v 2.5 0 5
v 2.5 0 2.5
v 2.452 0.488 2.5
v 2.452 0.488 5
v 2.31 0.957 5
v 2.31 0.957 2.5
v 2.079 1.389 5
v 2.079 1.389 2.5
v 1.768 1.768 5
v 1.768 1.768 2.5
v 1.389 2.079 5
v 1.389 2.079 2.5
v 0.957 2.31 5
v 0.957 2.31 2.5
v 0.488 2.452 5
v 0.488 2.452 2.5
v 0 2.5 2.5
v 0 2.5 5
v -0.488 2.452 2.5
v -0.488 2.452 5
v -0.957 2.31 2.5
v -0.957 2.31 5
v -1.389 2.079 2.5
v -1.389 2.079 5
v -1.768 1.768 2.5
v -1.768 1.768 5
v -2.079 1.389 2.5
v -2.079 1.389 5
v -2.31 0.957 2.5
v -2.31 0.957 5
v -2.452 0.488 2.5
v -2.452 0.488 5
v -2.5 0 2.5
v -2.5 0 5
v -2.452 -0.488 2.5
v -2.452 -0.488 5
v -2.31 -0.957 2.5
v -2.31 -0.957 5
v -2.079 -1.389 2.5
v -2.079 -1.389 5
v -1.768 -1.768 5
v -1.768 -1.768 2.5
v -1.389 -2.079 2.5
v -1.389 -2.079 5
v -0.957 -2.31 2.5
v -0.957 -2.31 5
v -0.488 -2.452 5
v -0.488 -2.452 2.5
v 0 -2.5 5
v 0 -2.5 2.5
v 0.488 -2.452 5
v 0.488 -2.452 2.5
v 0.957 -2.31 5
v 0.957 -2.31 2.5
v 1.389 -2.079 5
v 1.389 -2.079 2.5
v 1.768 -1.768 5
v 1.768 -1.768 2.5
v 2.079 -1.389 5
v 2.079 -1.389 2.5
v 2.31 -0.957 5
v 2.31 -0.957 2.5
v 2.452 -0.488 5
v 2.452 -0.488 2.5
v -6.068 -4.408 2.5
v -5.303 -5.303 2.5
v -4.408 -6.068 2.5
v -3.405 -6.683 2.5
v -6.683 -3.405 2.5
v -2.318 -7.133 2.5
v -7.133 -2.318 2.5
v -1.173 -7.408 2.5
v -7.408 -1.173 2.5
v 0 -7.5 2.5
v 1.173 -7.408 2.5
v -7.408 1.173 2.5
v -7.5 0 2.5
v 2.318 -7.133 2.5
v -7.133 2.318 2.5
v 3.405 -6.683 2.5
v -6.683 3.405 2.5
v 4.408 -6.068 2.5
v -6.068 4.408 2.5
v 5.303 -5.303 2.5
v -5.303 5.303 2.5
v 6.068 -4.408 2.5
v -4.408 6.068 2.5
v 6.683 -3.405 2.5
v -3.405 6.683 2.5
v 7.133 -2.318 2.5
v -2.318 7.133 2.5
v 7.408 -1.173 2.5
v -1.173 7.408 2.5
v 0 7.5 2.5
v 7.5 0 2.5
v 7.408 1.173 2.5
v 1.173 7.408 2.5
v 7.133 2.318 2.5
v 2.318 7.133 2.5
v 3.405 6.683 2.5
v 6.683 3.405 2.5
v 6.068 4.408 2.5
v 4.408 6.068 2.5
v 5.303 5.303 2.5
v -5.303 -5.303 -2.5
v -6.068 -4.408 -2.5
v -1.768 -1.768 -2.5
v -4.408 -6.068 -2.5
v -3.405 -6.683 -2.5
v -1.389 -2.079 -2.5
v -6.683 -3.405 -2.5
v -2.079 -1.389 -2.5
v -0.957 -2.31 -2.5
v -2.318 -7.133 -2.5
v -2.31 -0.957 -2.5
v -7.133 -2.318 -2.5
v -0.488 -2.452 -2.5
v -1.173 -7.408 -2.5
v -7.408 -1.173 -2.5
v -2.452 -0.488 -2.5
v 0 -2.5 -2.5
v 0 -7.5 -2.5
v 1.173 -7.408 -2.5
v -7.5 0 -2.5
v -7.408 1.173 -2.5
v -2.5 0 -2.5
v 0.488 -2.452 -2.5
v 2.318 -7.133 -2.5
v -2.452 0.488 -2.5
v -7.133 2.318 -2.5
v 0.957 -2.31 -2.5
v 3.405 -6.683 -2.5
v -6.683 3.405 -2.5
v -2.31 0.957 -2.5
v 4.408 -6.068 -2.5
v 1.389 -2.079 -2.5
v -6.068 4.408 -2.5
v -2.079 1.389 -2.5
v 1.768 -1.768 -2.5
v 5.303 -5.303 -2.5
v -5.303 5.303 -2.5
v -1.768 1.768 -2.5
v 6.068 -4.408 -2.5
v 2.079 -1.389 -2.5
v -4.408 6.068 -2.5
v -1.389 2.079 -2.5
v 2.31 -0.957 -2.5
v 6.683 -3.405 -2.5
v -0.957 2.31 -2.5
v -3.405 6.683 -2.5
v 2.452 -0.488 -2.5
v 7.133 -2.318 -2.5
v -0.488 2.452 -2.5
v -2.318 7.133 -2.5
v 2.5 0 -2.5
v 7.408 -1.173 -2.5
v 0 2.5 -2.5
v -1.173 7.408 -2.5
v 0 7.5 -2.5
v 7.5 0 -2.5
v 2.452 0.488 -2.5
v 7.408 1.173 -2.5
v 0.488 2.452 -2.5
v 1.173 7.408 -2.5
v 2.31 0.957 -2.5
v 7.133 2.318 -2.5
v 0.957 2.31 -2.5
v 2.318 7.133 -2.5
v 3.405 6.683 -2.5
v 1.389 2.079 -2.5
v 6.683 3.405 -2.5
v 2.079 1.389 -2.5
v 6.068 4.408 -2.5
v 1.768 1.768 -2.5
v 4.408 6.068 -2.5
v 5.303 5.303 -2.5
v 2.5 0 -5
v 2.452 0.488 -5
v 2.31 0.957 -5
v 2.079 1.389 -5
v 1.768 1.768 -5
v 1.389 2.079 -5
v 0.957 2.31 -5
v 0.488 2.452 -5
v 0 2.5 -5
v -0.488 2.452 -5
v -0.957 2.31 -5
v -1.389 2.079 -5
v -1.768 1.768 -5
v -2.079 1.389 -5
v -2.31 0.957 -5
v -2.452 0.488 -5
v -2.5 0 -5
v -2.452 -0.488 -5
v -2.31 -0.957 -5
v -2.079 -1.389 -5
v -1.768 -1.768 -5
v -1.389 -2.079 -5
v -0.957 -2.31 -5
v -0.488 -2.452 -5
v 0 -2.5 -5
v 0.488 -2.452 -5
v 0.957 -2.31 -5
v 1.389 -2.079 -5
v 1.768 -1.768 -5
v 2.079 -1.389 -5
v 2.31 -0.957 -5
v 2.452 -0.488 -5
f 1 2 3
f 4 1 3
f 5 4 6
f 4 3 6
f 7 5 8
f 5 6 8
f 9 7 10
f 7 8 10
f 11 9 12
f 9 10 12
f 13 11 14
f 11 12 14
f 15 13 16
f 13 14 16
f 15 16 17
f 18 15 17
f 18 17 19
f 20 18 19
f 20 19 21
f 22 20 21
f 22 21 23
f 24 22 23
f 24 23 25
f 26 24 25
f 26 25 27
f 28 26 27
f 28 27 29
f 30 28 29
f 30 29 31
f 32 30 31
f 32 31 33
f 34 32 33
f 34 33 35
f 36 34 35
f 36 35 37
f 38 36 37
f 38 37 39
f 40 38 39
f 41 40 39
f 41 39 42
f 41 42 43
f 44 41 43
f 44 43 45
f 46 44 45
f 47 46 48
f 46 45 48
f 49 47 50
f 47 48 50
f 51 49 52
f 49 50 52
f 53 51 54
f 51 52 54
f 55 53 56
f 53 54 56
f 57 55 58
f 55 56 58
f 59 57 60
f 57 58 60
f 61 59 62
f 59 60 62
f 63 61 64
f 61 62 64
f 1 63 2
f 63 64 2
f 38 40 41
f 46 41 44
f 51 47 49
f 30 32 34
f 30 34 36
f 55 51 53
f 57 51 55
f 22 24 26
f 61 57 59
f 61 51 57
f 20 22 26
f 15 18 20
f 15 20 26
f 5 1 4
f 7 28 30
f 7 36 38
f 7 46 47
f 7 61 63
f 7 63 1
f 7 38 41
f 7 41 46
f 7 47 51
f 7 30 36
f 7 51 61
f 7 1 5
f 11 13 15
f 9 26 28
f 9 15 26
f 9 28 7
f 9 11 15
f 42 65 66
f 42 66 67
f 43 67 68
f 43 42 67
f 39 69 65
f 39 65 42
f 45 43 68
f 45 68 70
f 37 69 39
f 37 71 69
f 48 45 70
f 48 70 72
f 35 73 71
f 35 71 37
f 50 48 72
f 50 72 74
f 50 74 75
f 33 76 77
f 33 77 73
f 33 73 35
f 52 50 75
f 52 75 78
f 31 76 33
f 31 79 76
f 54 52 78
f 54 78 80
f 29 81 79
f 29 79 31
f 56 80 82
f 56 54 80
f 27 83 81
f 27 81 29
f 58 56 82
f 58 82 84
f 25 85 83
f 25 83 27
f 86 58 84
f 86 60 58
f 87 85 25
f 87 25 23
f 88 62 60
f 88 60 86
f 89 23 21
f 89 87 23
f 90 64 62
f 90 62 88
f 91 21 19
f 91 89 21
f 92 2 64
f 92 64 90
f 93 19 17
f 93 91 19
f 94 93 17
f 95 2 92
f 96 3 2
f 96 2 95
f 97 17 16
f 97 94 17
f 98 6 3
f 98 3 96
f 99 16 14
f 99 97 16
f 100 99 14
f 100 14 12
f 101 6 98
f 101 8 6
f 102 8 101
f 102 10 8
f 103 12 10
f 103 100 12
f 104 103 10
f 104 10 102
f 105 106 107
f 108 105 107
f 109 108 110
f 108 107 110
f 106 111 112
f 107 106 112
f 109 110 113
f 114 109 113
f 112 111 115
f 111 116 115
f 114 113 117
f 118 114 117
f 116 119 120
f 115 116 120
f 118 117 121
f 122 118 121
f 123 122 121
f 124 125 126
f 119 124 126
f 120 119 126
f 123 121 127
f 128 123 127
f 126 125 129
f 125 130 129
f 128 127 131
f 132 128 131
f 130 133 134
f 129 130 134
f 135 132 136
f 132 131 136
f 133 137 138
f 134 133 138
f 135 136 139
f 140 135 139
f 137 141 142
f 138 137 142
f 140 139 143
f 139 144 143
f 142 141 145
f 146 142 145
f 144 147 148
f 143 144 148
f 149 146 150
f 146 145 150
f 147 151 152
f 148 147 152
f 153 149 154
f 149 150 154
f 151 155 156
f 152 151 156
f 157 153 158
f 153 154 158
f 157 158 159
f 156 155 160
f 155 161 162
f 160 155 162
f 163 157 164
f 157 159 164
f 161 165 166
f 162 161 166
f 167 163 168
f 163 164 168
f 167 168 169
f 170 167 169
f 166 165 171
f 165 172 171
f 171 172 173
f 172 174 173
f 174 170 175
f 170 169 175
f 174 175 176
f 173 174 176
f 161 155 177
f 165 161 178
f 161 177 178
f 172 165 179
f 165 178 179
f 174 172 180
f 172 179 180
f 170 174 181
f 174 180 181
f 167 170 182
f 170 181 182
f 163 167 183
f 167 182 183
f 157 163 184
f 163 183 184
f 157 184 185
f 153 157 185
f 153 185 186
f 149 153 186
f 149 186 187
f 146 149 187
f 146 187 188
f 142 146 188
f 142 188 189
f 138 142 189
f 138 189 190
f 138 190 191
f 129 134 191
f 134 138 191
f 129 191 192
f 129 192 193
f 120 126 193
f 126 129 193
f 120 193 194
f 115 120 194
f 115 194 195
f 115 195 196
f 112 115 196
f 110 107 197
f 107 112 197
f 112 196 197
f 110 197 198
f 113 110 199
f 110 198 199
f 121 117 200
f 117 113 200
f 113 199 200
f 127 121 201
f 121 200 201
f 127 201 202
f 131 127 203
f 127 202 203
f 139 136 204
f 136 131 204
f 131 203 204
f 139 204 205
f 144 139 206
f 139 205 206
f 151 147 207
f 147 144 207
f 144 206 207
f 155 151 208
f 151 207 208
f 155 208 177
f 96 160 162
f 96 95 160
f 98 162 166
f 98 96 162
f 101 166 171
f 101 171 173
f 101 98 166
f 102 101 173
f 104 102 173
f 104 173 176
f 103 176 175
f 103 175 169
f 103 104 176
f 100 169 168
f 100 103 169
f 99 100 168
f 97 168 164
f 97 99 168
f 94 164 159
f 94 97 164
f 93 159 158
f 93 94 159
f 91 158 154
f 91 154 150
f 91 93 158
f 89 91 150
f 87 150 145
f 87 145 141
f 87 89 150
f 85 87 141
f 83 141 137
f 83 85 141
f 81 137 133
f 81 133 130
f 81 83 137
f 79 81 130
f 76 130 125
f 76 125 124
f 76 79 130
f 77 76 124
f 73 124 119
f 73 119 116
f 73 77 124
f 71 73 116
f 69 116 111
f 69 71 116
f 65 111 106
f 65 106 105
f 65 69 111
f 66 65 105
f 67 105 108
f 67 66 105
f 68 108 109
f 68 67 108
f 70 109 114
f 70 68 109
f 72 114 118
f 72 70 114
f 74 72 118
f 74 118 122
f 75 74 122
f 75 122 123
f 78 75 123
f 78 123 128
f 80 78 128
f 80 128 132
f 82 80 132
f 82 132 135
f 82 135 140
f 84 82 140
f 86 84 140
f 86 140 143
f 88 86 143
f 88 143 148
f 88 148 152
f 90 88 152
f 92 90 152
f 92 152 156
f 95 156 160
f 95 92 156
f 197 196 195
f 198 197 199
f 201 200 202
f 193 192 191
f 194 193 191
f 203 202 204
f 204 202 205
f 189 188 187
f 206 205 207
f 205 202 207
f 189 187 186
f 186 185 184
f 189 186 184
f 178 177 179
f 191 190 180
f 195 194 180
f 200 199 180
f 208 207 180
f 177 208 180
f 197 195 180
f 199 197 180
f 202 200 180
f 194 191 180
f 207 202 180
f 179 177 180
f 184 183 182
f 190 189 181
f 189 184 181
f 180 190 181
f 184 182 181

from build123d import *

# Parameters (mm, degrees)
SKETCH2_R                = 7.5
BOSS_EXTRUDE1_DEPTH      = 2.5
BOSS_EXTRUDE2_DEPTH      = 5
BOSS_EXTRUDE2_DEPTH_BACK = 5
SKETCH3_R                = 2.5


with BuildPart() as part:
    # Sketch2 → Boss-Extrude1 (new, symmetric)
    with BuildSketch(Plane.XY):
        Circle(SKETCH2_R)
    extrude(amount=BOSS_EXTRUDE1_DEPTH, both=True)

    # Sketch3 → Boss-Extrude2 (add, two sides: drawn at the far end of the back side and taken through both)
    with BuildSketch(Plane.XY.offset(-BOSS_EXTRUDE2_DEPTH_BACK)):
        Circle(SKETCH3_R)
    extrude(amount=BOSS_EXTRUDE2_DEPTH + BOSS_EXTRUDE2_DEPTH_BACK)


solid = part.part
